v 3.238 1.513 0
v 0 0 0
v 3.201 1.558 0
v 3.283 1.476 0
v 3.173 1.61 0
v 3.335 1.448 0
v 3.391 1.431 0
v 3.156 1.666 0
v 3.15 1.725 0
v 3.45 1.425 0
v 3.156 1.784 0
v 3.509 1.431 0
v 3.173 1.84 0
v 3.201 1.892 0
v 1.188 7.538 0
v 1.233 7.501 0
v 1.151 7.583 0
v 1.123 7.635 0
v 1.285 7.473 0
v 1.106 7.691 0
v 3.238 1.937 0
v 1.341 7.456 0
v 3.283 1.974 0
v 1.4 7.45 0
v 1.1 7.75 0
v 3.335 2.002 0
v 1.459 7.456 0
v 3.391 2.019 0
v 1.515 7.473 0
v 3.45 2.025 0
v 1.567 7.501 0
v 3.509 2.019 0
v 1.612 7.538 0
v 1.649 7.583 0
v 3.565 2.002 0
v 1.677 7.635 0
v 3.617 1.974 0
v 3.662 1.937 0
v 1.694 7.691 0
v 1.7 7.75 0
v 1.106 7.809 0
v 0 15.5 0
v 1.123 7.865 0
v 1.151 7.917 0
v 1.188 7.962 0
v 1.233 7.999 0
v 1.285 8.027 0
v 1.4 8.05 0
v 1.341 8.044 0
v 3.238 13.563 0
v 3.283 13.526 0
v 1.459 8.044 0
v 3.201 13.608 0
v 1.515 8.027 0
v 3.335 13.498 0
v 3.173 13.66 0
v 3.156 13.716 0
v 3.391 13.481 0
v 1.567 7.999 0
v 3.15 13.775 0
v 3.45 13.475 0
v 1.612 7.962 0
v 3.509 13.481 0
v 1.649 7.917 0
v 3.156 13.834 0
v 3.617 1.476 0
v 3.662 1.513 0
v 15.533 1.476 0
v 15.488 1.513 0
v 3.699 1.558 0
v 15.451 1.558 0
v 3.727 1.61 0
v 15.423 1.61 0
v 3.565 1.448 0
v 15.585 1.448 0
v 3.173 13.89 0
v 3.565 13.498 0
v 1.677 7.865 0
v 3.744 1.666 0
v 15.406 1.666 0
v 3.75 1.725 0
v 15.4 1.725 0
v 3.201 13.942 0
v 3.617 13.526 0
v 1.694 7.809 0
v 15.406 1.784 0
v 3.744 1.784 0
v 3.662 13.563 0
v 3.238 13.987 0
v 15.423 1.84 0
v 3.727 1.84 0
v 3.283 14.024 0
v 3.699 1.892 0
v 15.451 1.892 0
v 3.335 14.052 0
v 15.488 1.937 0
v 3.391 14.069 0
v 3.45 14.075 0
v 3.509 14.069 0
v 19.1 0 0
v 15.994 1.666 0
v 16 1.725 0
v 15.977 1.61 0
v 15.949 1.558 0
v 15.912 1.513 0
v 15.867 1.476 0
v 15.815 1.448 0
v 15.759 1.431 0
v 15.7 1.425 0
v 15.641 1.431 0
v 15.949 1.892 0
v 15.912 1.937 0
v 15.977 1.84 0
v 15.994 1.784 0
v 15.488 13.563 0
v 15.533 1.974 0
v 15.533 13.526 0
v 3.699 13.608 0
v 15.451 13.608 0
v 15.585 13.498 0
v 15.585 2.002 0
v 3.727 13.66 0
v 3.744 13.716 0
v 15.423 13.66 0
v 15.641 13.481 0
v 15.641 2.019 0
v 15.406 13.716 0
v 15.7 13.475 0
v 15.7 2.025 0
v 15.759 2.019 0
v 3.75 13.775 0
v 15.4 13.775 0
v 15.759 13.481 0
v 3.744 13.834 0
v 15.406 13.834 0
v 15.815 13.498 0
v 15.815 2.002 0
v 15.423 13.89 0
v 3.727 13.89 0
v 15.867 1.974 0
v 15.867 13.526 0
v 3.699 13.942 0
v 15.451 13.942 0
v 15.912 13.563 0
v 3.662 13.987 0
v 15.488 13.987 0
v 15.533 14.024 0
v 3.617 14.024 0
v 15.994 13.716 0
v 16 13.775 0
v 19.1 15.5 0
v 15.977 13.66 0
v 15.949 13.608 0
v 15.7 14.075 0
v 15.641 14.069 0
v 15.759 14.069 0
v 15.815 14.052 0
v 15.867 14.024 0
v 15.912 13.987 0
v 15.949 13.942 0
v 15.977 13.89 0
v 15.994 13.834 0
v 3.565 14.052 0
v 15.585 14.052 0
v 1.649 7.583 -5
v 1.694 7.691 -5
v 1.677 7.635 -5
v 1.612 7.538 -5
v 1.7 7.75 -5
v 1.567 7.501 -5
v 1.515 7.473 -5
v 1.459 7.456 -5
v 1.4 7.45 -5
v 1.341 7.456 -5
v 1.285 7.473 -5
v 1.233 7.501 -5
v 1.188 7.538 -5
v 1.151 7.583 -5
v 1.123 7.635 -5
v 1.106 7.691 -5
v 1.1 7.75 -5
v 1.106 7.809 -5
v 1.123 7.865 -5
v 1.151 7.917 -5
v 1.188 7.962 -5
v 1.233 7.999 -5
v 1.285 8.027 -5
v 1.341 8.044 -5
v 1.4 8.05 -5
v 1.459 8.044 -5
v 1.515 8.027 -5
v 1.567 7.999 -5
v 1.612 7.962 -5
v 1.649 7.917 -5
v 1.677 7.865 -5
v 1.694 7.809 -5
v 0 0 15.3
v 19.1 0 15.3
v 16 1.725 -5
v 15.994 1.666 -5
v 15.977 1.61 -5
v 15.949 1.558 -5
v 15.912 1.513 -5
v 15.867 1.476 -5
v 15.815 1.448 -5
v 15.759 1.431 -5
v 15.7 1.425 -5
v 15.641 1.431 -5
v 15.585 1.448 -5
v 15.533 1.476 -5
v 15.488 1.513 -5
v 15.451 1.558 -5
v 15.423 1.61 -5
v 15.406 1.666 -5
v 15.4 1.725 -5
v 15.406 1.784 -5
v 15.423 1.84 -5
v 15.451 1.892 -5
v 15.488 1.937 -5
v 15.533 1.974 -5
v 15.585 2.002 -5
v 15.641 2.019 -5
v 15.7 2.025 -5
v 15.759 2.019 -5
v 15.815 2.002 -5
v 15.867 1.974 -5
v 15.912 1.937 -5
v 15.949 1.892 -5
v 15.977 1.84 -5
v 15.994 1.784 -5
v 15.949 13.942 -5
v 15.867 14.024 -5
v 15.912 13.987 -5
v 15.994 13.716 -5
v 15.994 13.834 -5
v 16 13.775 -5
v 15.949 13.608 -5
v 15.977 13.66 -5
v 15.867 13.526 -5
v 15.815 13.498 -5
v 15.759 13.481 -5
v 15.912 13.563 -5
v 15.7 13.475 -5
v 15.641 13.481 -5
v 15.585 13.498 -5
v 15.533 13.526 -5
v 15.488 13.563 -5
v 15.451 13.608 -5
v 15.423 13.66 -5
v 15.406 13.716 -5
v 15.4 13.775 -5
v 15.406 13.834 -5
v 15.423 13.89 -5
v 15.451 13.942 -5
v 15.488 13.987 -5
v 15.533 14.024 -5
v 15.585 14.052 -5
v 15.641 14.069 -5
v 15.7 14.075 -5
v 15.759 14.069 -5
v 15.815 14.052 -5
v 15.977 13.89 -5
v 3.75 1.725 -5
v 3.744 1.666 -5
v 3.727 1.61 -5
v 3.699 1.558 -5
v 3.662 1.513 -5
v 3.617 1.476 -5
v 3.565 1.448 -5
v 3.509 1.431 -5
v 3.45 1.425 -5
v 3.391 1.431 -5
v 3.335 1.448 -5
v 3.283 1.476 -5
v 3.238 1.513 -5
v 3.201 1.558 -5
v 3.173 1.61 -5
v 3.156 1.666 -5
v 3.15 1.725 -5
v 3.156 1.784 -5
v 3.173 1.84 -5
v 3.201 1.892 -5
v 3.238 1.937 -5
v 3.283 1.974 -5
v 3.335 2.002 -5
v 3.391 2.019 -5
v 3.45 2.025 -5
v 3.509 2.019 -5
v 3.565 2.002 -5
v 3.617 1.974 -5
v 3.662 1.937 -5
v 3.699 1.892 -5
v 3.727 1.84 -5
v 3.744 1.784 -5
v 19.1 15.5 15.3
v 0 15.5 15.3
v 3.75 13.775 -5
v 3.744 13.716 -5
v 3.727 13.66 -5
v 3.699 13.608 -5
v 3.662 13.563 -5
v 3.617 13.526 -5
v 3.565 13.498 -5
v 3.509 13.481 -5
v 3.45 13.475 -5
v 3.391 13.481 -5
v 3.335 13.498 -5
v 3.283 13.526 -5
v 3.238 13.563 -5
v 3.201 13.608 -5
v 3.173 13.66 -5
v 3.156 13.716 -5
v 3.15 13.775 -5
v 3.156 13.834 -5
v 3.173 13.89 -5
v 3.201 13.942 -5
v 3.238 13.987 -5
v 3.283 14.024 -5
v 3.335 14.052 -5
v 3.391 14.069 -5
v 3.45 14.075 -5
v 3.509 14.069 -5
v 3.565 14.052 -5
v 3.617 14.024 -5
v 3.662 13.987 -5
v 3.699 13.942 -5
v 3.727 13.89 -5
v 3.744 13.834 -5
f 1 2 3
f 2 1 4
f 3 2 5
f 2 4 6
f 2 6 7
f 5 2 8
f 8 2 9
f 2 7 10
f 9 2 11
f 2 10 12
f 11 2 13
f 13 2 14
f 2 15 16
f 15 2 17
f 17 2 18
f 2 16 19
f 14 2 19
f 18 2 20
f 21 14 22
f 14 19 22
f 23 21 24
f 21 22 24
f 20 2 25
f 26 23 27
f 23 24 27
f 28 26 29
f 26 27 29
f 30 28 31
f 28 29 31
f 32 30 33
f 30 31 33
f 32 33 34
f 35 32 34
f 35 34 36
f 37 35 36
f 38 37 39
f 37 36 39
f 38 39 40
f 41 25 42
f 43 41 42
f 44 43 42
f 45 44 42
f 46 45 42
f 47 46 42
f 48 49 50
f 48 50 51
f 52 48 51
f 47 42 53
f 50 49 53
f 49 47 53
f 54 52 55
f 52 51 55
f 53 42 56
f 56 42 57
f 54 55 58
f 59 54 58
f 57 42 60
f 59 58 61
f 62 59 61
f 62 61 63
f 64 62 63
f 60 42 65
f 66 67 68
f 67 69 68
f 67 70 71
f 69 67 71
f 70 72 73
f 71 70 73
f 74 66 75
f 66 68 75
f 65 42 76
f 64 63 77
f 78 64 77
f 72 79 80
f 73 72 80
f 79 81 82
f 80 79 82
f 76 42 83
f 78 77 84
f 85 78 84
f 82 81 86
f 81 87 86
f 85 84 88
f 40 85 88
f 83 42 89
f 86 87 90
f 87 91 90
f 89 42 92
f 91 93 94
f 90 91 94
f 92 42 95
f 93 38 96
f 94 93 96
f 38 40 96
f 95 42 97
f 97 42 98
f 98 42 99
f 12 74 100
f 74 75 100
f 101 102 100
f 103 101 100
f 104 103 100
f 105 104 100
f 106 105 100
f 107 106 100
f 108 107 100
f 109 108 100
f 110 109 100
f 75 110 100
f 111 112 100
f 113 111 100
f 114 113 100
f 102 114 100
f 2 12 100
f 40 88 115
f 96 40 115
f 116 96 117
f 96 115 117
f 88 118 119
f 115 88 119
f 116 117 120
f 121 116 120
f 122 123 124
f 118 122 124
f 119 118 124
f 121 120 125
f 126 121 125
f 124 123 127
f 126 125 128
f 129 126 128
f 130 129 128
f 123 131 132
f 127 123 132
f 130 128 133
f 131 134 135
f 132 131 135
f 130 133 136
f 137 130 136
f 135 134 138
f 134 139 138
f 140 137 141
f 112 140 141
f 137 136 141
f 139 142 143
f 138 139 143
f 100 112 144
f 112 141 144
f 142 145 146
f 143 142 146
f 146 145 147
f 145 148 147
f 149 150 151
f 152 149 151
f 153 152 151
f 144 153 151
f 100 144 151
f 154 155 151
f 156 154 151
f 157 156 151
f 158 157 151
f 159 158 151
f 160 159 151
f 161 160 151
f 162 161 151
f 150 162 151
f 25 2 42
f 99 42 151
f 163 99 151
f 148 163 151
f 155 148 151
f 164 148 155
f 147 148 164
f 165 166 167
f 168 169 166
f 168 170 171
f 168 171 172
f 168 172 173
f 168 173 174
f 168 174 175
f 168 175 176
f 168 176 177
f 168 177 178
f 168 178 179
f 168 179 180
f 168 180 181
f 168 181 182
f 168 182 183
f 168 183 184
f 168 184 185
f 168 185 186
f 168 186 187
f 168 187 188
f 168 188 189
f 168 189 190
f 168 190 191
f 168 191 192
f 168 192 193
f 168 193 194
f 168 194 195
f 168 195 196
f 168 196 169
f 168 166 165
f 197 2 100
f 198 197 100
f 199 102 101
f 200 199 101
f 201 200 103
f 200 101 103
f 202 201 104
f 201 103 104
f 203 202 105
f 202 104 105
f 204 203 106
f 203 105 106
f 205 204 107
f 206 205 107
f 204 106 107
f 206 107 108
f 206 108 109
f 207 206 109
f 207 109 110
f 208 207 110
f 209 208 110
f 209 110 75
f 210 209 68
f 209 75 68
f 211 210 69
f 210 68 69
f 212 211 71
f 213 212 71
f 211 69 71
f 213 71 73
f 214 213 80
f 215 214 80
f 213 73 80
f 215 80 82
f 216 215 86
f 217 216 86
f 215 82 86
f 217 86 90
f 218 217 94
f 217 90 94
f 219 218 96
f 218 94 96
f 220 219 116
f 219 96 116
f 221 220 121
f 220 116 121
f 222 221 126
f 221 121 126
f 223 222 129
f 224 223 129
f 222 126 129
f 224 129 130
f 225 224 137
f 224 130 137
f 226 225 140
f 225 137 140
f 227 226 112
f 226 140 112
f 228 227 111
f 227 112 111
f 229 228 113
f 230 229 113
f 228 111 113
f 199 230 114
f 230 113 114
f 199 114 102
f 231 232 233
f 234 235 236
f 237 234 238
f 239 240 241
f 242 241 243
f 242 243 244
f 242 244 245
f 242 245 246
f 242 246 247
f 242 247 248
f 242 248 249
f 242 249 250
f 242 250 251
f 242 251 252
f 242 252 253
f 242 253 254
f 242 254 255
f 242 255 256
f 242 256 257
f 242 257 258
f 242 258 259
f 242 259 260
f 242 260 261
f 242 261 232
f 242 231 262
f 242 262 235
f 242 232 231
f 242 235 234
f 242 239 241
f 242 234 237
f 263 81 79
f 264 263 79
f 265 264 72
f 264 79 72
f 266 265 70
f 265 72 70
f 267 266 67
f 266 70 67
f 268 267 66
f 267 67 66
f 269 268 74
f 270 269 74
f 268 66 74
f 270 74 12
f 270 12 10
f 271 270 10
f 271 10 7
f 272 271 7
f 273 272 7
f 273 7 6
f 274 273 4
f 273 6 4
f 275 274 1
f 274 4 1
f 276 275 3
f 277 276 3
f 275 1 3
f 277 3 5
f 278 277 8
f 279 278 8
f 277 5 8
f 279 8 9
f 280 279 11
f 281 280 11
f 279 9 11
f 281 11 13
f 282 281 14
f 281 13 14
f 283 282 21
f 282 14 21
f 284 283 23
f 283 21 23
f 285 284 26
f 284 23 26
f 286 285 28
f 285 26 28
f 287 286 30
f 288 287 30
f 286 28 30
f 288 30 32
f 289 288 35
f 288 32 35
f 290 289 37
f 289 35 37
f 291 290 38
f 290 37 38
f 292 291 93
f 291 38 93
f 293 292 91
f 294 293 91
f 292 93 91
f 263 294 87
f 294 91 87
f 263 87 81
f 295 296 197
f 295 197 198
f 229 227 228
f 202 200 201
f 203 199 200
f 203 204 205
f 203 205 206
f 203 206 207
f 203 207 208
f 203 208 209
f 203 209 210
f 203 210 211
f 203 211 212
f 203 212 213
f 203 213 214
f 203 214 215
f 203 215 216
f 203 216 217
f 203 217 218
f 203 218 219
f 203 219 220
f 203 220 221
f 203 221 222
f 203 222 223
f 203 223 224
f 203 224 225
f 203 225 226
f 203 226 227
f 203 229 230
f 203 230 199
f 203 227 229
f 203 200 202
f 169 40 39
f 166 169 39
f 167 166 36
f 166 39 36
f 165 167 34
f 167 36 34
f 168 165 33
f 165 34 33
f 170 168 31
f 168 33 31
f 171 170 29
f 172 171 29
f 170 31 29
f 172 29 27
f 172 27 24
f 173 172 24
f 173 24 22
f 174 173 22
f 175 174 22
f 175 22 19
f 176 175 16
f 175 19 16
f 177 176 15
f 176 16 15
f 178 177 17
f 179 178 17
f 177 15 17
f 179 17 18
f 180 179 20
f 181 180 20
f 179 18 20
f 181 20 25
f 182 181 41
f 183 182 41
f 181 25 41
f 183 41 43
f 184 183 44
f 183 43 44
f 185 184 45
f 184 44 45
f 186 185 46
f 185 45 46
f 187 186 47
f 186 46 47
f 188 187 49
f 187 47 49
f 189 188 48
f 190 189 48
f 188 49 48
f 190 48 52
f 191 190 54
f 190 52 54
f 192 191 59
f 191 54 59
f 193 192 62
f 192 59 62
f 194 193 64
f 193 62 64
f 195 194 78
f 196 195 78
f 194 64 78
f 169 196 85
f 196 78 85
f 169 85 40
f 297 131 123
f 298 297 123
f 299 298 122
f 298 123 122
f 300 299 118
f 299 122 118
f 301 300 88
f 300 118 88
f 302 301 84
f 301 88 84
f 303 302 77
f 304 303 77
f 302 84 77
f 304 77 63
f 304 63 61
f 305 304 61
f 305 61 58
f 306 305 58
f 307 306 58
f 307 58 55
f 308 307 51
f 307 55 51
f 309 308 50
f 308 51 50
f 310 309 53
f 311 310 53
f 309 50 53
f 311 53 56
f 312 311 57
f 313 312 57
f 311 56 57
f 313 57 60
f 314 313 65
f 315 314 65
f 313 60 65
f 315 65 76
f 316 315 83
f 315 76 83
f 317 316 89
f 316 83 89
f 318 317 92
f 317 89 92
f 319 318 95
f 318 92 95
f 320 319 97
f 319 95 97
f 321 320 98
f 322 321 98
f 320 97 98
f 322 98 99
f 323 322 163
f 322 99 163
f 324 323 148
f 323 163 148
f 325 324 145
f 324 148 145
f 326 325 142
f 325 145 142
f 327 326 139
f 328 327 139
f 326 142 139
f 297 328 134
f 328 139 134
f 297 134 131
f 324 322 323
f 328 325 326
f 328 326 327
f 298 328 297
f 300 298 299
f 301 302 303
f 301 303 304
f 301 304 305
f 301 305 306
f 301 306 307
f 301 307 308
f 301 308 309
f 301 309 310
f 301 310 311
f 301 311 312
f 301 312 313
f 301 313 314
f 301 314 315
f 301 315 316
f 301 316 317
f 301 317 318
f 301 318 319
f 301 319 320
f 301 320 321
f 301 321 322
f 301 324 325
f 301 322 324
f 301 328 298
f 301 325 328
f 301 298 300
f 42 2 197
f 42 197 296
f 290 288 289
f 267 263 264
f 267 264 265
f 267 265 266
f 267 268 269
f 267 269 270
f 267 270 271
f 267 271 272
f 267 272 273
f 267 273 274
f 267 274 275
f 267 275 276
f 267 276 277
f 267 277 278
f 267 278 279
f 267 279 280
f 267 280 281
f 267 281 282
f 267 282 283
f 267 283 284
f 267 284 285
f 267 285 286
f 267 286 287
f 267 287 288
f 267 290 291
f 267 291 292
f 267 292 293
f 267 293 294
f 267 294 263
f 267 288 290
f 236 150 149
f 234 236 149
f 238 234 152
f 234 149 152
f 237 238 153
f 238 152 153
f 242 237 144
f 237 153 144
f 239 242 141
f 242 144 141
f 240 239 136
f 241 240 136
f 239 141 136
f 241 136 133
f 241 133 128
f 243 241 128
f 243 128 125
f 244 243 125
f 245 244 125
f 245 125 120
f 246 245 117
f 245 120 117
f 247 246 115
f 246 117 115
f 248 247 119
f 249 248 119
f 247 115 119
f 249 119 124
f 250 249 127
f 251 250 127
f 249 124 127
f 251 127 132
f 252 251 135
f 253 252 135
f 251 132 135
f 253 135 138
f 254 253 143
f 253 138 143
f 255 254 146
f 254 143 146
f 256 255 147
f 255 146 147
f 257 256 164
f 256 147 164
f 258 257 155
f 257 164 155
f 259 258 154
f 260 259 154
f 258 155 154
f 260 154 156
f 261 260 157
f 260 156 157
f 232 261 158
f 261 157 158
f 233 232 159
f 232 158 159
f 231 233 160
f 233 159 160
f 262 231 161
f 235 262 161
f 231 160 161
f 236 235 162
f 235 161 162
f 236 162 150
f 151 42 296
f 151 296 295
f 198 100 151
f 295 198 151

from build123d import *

# Parameters (mm, degrees)
BOX_W     = 19.1
BOX_H     = 15.5
BOX_DEPTH = 15.3
SKETCH_R  = 0.3
PAD_DEPTH = 5
FILLET_R  = 0.1


with BuildPart() as cube:
    # Box → Box (new body)
    with BuildSketch(Plane.XY):
        with Locations((9.55, 7.75)):
            Rectangle(BOX_W, BOX_H)
    extrude(amount=BOX_DEPTH)


with BuildPart() as pad:
    # Pad base: copy of Cube
    add(cube.part)

    # Sketch → Pad (new body)
    with BuildSketch(Plane(origin=(0, 0, 0), x_dir=(1, 0, 0), z_dir=(0, 0, -1))):
        with Locations((1.4, -7.75)):
            Circle(SKETCH_R)
        with Locations((3.45, -1.725)):
            Circle(SKETCH_R)
        with Locations((15.7, -1.725)):
            Circle(SKETCH_R)
        with Locations((3.45, -13.775)):
            Circle(SKETCH_R)
        with Locations((15.7, -13.775)):
            Circle(SKETCH_R)
    extrude(amount=PAD_DEPTH)


with BuildPart() as fillet_body:
    # Fillet base: copy of Pad
    add(pad.part)

    # Fillet
    fillet_edges = [fillet_body.edges().sort_by_distance(p)[0] for p in [
        (9.55, 0, 15.3),
        (0, 7.75, 15.3),
        (9.55, 15.5, 15.3),
        (19.1, 7.75, 15.3),
    ]]
    fillet(fillet_edges, radius=FILLET_R)


with BuildPart() as fusion:
    # Fusion base: copy of Pad
    add(pad.part)

    # Fusion: union Fillet body
    add(fillet_body.part)


with BuildPart() as fusion001:
    # Fusion001 base: copy of Cube
    add(cube.part)

    # Fusion001: union Fusion
    add(fusion.part)


solid = fusion001.part
